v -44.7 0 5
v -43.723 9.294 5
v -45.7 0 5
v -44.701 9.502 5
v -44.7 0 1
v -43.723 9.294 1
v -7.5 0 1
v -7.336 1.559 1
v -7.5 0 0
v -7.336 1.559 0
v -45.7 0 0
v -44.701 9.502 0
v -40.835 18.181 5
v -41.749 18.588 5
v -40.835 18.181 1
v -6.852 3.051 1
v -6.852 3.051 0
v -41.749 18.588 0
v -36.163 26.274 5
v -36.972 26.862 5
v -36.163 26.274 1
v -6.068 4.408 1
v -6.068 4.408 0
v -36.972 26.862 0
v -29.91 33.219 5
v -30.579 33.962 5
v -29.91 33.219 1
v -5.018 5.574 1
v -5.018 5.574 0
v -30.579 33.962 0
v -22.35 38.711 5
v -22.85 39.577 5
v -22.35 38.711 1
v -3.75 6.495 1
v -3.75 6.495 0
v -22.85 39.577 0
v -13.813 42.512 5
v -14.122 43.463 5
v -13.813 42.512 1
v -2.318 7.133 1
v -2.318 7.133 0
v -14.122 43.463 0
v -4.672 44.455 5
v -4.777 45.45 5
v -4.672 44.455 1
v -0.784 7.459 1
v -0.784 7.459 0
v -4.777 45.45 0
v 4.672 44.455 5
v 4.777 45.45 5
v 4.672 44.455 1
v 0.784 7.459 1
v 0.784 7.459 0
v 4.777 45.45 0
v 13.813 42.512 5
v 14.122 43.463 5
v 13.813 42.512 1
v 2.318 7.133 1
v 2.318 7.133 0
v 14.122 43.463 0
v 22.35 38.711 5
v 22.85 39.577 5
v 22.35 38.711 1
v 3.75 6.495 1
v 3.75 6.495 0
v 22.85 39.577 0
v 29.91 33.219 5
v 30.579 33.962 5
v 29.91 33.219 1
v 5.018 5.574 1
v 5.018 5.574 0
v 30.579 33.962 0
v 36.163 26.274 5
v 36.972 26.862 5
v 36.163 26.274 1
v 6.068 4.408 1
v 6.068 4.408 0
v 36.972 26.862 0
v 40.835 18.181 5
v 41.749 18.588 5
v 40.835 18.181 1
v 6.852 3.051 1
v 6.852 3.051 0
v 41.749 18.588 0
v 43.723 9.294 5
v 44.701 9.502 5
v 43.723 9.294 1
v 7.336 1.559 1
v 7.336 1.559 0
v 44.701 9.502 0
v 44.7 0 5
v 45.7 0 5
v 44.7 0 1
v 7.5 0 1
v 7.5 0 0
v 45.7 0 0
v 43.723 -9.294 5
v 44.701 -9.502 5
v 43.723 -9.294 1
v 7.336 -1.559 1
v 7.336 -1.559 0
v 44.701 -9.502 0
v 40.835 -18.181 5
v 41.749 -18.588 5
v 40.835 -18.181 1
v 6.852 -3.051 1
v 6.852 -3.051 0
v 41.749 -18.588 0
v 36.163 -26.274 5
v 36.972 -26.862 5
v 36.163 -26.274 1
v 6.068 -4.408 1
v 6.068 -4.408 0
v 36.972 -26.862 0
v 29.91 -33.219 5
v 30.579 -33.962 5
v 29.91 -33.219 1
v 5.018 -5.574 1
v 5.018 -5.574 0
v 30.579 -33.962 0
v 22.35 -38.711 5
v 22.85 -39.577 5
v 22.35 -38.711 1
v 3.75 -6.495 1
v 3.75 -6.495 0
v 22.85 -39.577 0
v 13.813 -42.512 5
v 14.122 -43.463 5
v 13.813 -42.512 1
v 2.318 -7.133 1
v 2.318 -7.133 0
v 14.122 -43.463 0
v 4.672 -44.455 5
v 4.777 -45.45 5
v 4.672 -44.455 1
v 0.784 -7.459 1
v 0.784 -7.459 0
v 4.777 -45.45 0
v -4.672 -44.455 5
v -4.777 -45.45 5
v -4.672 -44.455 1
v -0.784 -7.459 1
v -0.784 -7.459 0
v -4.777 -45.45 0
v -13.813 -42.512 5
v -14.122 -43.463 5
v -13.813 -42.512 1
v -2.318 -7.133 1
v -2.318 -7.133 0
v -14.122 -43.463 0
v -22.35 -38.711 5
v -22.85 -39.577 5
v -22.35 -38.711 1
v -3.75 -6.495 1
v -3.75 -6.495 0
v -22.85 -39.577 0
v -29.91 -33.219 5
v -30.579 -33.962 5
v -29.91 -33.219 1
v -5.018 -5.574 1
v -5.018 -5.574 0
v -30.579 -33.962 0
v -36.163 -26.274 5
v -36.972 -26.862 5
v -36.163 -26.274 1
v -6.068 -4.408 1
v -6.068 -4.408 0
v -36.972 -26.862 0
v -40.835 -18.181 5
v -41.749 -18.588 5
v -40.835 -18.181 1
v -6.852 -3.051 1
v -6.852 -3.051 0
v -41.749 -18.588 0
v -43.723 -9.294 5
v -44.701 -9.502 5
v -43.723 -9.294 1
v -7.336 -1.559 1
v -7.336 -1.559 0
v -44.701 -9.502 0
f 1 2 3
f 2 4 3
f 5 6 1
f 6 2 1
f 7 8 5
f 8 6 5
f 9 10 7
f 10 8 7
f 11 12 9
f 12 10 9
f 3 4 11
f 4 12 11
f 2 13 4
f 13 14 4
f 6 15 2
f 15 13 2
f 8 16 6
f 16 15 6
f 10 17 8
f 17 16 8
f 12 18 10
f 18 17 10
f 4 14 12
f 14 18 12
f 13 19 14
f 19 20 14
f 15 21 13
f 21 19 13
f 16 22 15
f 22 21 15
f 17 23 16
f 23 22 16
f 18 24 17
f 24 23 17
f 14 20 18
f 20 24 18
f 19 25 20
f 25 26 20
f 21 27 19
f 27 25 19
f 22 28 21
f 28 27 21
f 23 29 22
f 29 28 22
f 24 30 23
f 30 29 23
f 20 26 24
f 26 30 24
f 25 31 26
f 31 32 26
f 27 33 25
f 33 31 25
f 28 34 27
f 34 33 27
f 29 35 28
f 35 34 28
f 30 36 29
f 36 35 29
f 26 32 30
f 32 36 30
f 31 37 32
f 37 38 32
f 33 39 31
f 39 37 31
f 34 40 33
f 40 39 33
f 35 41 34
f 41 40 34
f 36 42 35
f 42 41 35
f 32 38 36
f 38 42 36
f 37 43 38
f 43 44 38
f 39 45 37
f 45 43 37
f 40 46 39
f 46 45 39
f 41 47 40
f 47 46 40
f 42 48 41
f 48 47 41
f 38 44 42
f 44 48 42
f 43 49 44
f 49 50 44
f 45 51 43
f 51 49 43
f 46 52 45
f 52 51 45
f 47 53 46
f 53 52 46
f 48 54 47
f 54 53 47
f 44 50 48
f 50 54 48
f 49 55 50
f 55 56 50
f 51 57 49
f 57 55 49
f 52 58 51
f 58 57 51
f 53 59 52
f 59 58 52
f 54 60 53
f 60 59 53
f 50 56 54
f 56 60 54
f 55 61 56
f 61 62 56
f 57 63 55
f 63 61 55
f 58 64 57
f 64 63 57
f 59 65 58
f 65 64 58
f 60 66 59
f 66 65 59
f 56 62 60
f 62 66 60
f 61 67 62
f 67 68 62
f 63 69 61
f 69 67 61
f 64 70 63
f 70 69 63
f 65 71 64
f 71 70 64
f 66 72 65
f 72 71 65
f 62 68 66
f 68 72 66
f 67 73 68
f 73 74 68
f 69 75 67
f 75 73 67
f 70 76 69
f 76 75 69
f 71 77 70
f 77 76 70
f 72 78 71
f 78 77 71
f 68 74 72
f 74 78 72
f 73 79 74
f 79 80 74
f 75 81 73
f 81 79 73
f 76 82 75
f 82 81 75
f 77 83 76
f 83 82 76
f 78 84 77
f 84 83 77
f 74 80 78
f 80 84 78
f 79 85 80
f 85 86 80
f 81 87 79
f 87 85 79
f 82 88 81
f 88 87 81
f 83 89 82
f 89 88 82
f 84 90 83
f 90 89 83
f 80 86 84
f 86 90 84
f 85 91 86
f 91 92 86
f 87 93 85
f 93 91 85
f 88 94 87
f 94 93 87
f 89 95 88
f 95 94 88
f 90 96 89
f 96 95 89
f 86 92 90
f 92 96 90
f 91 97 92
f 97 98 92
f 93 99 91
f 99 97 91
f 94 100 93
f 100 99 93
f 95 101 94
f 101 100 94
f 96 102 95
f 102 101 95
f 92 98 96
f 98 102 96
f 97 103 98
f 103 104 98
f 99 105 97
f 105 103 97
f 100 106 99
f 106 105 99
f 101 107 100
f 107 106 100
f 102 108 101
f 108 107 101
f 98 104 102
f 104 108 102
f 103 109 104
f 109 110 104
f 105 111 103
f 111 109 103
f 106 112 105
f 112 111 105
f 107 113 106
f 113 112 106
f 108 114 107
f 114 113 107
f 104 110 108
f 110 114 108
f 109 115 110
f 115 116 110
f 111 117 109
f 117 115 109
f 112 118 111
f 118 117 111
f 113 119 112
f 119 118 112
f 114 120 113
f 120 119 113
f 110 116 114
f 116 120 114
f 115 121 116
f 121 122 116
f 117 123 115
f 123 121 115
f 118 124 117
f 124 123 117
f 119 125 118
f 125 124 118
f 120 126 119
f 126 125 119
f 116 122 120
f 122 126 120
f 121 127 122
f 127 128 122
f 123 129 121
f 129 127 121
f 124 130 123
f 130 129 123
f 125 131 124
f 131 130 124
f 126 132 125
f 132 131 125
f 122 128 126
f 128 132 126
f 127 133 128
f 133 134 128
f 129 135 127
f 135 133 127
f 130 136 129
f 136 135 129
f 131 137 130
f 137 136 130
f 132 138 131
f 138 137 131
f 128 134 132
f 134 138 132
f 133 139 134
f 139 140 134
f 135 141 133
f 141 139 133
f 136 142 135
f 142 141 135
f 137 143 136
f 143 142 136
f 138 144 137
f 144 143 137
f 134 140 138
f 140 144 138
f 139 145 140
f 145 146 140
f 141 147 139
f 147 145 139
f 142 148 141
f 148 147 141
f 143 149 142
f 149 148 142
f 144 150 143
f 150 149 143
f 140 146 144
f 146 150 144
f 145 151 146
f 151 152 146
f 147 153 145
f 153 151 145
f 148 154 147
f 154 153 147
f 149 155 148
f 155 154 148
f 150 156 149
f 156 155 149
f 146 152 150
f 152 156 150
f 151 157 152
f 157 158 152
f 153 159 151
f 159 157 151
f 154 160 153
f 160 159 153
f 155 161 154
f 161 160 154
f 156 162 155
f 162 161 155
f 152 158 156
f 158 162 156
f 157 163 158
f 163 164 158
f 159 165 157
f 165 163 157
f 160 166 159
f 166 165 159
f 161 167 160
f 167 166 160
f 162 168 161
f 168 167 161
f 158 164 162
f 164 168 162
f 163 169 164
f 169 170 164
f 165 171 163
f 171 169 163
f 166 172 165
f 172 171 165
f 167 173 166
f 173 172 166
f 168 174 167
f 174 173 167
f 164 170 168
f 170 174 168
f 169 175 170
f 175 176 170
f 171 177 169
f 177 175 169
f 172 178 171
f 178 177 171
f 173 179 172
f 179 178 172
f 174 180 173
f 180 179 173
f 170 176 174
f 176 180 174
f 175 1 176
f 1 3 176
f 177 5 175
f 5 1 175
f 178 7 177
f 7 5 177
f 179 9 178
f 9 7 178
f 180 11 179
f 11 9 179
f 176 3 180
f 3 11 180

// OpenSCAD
// units are in millimeters as measured with metric calipers, approximate values
function breadwinner_diameter() = 87.4;
function breadwinner_edge_height() = 4.0;
function breadwinner_center_sensor_hole_diameter() = 15.0;

function default_wall_thickness() = 1.0;

module breadwinner_socket(t = default_wall_thickness()) {
    baseplate_w = (breadwinner_diameter() - breadwinner_center_sensor_hole_diameter()) / 2 + t ;
    
    baseplate_offset_x = breadwinner_center_sensor_hole_diameter() / 2;
    skirt_offset_x = baseplate_offset_x + baseplate_w;
    skirt_h = breadwinner_edge_height() + t;
    
    rotate_extrude() {
        union() {
            translate([baseplate_offset_x, 0]) square([baseplate_w, t], center = false);
            translate([skirt_offset_x, 0]) square([t, skirt_h], center = false);
        }
    }
}

breadwinner_socket();
